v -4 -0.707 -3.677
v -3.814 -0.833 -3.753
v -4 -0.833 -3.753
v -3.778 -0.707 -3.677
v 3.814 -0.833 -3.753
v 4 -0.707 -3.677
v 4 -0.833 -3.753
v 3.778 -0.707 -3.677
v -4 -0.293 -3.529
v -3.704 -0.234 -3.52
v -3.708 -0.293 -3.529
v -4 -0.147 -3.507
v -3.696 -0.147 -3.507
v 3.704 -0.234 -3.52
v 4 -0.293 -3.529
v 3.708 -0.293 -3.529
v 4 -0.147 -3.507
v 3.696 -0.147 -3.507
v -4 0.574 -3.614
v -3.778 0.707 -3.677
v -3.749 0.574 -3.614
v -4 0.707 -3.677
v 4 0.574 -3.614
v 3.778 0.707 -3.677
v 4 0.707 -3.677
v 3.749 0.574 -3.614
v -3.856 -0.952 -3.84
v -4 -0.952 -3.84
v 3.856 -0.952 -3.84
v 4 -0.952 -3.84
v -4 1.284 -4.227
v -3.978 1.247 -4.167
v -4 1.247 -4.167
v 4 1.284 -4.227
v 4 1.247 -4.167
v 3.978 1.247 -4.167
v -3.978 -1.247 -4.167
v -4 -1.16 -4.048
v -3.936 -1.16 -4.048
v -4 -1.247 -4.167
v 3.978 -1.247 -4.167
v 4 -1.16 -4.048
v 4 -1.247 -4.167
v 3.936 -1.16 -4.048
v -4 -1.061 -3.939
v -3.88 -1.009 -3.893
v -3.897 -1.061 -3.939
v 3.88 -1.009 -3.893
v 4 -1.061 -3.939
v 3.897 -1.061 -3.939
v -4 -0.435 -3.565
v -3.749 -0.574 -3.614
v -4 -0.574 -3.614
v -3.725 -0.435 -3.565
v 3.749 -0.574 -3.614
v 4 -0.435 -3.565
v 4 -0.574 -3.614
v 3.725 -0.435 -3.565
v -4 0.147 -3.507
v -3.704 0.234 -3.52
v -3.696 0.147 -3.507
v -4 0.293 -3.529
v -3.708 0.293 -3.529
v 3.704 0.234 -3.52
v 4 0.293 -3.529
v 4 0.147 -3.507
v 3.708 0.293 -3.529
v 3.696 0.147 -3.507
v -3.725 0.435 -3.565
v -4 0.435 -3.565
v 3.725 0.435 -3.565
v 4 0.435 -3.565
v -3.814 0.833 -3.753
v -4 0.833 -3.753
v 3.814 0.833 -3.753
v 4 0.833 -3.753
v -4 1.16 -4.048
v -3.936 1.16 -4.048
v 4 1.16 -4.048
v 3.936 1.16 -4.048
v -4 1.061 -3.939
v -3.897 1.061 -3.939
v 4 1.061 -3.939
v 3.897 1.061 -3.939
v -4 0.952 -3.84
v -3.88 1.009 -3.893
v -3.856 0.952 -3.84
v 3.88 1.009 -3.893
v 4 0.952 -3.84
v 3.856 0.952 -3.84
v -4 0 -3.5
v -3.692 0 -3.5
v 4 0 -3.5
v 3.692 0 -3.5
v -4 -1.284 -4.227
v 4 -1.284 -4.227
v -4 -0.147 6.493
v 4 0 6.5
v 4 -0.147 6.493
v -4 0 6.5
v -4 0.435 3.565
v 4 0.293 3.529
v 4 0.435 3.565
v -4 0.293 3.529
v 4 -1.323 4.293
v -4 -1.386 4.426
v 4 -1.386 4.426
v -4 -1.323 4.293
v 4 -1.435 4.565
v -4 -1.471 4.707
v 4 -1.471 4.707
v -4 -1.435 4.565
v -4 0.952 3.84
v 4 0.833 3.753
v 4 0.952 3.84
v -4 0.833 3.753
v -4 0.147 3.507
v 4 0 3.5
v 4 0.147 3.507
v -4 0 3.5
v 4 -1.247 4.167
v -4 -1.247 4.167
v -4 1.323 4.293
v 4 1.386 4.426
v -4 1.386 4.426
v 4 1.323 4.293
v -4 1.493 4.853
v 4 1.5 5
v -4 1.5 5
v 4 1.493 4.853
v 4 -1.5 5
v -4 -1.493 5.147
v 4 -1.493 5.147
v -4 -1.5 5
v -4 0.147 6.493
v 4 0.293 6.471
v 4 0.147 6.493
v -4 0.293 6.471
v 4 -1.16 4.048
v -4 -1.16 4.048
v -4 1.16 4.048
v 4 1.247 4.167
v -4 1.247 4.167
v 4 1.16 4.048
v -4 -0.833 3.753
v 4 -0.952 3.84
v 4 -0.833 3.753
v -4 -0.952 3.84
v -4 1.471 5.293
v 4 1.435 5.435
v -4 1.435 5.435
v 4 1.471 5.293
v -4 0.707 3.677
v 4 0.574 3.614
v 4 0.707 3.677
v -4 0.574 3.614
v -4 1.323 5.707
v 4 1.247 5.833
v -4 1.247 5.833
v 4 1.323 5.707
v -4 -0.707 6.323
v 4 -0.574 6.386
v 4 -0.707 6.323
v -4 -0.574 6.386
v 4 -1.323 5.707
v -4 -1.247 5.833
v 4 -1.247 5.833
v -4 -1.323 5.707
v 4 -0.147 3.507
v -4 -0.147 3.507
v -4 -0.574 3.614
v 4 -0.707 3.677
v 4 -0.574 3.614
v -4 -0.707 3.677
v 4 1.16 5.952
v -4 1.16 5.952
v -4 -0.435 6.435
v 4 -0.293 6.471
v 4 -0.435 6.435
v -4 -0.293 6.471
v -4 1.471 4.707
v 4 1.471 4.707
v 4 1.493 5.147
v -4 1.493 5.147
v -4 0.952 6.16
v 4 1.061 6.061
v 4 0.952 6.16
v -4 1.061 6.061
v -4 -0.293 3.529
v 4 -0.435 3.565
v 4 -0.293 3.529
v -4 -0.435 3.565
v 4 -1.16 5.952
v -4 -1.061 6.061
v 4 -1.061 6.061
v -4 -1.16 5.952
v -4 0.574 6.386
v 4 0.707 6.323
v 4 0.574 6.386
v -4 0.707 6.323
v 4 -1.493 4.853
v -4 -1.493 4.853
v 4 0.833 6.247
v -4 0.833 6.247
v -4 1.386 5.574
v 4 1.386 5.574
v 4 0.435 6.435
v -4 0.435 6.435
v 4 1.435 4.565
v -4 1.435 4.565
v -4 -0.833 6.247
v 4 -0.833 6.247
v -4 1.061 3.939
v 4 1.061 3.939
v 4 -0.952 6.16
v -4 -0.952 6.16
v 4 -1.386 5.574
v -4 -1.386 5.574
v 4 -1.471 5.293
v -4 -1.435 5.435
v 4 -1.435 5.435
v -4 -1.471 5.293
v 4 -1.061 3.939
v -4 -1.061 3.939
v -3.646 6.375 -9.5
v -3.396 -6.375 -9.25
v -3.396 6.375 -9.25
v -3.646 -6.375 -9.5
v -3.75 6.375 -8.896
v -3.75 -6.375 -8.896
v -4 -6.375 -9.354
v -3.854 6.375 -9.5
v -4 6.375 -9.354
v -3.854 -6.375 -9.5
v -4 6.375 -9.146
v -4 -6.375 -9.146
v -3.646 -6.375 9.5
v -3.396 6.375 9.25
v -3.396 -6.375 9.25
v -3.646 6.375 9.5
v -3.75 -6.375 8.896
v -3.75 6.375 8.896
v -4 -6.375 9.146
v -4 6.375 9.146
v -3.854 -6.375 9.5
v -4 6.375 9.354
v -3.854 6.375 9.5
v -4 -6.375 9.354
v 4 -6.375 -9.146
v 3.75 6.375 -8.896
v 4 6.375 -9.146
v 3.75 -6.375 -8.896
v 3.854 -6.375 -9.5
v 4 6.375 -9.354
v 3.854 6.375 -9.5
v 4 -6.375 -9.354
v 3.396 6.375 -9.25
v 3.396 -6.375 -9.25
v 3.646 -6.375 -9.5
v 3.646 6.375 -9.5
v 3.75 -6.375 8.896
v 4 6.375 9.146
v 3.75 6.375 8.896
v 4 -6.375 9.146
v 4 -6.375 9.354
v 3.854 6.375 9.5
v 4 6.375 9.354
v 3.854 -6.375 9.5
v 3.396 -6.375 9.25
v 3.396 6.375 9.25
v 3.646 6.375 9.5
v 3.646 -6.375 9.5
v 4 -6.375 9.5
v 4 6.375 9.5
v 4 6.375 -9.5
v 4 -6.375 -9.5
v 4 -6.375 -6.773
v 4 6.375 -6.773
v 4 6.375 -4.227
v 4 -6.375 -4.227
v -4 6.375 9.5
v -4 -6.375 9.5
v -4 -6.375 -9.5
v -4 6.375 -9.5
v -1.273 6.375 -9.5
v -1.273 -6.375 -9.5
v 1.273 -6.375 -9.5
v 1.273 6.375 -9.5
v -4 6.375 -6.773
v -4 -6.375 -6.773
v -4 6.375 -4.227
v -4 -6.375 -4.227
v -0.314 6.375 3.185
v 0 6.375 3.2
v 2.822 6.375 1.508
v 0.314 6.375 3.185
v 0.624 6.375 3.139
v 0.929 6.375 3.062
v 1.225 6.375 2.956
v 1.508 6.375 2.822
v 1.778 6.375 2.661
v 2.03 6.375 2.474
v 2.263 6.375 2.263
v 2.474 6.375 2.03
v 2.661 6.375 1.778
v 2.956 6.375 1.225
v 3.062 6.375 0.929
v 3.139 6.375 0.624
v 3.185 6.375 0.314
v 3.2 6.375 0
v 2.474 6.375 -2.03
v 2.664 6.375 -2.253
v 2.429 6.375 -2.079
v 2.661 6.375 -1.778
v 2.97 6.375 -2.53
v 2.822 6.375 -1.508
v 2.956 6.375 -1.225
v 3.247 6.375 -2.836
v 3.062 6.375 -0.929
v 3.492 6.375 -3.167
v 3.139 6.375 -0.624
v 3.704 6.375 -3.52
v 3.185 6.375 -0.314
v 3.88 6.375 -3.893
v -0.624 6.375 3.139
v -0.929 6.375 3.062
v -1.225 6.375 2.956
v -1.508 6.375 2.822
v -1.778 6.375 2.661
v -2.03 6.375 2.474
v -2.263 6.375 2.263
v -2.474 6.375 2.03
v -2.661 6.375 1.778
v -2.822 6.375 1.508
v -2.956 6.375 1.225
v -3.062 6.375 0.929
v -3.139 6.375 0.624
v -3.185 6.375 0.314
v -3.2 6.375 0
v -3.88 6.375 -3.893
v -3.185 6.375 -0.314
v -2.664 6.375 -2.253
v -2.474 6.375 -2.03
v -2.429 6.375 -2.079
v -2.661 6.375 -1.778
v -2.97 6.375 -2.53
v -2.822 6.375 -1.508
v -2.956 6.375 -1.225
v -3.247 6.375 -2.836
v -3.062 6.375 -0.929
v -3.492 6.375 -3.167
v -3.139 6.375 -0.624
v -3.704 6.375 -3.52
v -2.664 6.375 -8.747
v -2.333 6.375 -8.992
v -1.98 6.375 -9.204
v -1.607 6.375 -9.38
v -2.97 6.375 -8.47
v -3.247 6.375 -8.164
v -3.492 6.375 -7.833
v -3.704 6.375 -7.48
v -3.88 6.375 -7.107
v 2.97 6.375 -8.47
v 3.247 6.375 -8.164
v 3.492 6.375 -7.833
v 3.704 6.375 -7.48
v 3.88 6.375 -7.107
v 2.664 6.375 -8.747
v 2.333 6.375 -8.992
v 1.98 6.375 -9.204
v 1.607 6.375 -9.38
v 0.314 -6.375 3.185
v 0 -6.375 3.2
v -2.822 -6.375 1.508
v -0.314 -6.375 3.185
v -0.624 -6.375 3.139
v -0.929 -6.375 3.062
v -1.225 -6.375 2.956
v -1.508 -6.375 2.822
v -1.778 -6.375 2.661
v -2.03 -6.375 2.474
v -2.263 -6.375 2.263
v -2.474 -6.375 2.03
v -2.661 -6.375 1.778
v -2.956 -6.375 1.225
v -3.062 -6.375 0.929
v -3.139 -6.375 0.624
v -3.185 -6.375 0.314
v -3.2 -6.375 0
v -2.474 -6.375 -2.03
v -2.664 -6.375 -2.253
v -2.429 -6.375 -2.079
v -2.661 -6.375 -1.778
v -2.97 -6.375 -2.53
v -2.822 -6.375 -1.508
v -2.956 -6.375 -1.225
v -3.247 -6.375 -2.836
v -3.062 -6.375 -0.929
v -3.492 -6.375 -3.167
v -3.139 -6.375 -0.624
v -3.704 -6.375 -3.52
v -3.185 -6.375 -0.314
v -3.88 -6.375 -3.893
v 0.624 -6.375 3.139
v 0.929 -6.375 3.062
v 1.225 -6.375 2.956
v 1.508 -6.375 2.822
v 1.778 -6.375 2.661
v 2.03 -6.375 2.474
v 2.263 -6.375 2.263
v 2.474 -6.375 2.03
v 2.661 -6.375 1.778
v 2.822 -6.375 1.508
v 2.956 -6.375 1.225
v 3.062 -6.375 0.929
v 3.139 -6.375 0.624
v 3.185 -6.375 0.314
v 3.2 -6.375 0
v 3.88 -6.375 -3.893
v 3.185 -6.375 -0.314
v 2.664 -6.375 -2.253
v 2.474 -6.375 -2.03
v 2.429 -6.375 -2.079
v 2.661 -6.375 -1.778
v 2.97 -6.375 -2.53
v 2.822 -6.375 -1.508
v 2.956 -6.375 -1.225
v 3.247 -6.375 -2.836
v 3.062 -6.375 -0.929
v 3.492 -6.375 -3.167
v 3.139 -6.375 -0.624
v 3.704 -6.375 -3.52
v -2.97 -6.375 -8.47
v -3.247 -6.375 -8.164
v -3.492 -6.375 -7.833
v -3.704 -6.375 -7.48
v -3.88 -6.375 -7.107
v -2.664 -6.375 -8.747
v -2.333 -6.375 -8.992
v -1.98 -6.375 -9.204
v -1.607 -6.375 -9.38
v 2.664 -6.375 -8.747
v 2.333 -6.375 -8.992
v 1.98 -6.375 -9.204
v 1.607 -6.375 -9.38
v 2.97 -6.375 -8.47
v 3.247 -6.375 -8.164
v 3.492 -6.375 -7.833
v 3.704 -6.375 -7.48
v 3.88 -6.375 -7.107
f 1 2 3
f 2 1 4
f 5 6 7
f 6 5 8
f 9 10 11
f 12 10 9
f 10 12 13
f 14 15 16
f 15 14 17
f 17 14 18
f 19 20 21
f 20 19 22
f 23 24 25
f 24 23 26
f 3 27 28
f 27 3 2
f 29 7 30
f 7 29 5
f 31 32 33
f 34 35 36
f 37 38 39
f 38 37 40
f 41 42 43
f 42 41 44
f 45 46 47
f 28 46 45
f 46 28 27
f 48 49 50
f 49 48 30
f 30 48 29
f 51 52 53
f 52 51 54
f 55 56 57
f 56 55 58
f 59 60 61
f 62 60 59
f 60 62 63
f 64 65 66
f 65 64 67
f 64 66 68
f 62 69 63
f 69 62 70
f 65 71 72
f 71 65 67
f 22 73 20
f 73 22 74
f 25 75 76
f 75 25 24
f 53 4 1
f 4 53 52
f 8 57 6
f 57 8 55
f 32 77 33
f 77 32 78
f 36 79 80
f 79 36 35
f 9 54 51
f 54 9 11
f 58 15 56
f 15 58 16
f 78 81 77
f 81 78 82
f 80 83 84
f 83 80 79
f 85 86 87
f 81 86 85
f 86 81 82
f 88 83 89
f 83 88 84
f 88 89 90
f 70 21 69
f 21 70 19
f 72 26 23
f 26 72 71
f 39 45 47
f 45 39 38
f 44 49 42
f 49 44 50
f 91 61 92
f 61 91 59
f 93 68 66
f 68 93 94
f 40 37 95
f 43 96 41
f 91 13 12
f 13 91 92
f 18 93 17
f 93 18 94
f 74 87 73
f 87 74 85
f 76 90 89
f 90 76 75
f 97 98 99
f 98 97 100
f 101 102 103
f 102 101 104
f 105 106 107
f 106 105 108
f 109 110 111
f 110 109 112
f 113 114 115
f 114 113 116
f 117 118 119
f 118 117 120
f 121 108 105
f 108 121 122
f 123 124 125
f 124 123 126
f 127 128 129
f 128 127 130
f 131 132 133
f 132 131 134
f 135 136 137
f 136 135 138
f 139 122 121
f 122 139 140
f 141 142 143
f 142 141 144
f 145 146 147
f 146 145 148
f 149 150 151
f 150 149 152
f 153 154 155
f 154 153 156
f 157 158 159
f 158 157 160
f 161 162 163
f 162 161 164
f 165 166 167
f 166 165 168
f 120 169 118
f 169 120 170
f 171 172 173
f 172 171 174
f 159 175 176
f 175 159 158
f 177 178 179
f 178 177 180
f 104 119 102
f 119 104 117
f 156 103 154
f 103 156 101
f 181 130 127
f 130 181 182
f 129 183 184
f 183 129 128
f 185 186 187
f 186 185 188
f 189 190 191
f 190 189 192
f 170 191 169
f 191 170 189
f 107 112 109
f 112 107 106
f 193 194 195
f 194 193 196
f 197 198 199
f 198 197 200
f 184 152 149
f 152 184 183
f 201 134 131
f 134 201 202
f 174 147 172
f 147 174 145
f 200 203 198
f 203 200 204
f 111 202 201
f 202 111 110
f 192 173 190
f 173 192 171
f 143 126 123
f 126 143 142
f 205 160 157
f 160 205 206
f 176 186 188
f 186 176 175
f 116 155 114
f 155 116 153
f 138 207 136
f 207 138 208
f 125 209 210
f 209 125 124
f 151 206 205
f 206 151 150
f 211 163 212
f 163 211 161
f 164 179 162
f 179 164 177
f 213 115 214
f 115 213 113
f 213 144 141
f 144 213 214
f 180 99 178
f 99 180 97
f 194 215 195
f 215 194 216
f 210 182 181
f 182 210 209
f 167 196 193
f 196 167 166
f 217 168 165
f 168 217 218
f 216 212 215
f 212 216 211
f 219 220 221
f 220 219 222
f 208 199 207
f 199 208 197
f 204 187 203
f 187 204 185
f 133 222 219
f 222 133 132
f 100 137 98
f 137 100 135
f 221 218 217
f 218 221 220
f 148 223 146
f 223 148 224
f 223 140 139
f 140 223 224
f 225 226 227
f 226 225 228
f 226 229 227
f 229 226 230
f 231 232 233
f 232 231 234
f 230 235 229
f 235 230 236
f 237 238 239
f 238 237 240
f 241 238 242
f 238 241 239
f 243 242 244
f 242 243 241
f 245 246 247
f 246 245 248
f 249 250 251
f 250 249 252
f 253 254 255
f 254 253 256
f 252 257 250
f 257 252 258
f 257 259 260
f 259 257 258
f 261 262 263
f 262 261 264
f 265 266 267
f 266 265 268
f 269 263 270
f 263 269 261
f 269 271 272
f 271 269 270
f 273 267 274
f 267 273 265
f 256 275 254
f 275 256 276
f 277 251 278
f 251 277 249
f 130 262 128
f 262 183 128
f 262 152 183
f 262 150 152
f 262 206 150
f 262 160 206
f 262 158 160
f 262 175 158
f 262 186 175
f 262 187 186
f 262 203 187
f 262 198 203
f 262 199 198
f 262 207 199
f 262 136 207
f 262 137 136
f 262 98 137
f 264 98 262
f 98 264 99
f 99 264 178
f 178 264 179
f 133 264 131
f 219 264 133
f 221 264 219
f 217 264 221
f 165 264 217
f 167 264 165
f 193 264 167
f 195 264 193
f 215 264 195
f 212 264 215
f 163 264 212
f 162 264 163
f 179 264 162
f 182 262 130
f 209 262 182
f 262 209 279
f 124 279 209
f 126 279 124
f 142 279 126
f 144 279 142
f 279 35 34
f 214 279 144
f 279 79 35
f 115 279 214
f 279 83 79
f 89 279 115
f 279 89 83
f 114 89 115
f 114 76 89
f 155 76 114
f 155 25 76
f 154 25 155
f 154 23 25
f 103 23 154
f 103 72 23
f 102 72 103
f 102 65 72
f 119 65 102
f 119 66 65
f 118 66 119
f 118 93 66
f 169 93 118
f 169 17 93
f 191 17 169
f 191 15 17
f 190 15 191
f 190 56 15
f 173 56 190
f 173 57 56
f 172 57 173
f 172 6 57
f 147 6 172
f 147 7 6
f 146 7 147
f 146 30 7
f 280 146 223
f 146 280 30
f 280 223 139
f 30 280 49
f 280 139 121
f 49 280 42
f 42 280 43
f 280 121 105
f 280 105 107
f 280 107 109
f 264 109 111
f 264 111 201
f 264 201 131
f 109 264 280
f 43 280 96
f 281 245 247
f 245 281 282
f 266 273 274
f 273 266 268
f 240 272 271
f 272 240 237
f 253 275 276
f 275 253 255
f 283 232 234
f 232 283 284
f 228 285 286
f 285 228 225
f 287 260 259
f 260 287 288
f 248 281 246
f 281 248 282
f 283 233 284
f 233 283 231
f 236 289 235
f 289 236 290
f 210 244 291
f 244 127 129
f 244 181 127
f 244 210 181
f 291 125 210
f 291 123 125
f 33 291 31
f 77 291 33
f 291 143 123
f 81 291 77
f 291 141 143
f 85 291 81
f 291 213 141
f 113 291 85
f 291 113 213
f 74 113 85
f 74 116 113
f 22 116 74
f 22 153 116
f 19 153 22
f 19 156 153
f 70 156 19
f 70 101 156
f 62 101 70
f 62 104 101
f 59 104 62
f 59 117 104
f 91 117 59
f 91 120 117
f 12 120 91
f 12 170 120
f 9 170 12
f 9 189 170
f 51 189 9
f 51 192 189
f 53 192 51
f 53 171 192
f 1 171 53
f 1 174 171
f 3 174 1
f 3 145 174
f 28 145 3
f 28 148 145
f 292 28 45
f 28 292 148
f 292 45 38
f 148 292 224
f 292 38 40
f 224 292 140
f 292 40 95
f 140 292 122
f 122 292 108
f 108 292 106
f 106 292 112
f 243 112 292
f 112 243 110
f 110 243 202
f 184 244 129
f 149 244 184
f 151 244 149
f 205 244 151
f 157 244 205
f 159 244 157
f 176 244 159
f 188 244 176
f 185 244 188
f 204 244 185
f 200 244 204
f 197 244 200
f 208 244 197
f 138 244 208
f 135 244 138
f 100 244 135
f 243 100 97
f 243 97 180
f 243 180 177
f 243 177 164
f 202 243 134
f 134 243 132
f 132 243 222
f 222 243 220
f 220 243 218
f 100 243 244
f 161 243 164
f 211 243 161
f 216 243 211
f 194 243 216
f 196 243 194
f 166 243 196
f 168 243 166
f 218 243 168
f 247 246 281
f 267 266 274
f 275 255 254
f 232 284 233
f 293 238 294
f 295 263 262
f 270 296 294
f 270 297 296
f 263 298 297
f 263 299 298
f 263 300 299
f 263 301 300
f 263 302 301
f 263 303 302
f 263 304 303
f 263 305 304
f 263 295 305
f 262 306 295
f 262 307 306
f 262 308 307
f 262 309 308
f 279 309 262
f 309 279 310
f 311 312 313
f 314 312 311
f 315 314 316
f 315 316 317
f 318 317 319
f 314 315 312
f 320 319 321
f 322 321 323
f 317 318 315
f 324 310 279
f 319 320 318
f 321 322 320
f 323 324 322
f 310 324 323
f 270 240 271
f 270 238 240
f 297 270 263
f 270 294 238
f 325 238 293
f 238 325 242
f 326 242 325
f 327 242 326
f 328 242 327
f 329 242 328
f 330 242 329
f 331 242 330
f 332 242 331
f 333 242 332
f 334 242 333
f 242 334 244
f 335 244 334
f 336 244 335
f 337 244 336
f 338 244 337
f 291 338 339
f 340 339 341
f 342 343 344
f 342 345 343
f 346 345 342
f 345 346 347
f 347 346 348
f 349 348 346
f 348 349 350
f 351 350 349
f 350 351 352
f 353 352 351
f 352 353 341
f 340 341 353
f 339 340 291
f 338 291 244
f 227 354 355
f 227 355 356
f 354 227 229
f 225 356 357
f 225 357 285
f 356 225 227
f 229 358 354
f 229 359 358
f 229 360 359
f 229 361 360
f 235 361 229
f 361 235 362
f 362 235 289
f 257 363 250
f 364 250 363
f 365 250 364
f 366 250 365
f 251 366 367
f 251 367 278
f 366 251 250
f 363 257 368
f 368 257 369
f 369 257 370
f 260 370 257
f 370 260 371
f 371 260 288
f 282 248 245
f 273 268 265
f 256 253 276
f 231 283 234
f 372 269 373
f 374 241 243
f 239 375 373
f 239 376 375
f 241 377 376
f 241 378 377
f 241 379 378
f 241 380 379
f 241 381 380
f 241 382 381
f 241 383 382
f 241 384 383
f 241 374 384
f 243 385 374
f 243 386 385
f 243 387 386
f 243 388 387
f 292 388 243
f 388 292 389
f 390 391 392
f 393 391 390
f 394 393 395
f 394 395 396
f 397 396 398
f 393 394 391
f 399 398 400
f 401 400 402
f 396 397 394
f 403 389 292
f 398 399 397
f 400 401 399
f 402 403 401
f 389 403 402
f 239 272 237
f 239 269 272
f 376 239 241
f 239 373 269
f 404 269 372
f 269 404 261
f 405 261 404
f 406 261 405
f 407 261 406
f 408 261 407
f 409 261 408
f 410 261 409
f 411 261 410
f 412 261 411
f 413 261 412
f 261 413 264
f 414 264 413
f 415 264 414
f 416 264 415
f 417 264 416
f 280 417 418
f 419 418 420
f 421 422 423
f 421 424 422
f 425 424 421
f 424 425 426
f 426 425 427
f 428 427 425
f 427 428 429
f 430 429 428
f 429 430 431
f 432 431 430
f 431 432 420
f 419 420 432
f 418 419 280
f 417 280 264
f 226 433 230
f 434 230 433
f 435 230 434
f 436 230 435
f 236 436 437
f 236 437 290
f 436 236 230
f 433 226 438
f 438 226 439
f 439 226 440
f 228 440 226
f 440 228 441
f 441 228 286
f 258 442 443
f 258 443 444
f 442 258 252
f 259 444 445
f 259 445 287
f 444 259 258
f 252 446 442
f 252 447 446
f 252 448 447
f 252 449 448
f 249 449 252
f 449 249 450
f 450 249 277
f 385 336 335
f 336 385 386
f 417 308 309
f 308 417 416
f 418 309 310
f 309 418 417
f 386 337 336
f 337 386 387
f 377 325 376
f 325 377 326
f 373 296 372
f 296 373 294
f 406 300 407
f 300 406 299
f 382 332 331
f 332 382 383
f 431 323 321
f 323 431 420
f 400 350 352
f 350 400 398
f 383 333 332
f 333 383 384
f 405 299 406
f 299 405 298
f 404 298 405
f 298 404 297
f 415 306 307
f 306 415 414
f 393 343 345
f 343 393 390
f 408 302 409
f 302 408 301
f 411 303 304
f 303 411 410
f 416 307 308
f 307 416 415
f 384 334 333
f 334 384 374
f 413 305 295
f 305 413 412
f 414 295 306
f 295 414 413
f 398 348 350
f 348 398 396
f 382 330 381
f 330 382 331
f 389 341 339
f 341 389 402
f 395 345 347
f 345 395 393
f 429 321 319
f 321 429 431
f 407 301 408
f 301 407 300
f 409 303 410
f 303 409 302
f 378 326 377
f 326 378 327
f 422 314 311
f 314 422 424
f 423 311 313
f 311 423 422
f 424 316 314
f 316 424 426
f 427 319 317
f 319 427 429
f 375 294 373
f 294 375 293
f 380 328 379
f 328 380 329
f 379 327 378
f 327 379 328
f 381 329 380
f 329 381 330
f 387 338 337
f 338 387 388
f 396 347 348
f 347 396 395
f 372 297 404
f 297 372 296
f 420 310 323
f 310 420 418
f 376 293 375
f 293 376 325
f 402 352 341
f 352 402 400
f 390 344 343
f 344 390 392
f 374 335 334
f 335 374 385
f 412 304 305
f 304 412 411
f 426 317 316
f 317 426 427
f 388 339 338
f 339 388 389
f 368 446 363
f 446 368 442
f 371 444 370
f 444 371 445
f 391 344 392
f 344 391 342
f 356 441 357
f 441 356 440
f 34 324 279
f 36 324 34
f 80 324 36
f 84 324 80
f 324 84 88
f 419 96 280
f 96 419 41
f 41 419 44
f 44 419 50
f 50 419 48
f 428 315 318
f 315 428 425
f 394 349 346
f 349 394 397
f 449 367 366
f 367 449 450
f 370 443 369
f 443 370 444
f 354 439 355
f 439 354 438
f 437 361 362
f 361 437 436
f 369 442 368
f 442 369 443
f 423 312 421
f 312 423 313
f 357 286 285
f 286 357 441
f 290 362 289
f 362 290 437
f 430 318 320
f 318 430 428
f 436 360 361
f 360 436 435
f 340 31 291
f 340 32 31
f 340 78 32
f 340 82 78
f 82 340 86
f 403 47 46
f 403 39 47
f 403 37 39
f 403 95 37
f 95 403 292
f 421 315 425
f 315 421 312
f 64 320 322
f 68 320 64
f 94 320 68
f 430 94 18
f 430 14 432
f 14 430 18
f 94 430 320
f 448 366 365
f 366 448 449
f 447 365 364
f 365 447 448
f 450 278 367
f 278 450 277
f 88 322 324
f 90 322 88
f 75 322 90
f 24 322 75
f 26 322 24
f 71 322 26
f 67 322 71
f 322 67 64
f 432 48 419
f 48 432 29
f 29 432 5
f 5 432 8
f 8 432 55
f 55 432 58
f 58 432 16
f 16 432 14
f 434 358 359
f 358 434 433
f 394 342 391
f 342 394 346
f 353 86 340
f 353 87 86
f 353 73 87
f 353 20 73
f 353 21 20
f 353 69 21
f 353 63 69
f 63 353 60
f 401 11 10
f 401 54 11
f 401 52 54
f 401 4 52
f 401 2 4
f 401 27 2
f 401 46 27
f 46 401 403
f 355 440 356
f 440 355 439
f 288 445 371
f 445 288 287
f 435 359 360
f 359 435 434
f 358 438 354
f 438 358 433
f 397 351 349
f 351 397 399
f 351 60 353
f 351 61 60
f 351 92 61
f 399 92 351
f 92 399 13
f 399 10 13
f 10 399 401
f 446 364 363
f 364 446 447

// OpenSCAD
// Leadscrew nut housing block: 8.0mm x 12.75mm x 19.0mm
// One connected solid (housing only). No separate leadscrew/leadnut parts.

// Parameters
block_width_mm  = 8.0;    //[4.0:16.0:0.25]   // X
block_height_mm = 12.75;  //[6.0:25.5:0.25]   // Y
block_length_mm = 19.0;   //[9.5:38.0:0.5]    // Z

clearance_mm = 0.2;       //[0.0:1.0:0.05]
chamfer_mm   = 0.5;       //[0.0:2.0:0.1]

bore_diameter_mm       = 6.0;  //[2.0:12.0:0.25]  // through-bore
nut_outer_diameter_mm  = 8.0;  //[4.0:16.0:0.25]  // counterbore/pocket diameter
nut_pocket_depth_mm    = 8.0;  //[0.0:19.0:0.5]   // pocket depth from one end along Z

mount_hole_diameter_mm = 3.0;  //[1.5:6.0:0.25]
mount_hole_spacing_mm  = 10.0; //[4.0:16.0:0.5]

overlap_mm = 1.0; //[0.5:2.0:0.1]
$fn = 64;

// Main housing (single solid with subtracted features)
module housing() {
  difference() {
    // Body
    cube([block_width_mm, block_height_mm, block_length_mm], center=true);

    // Through bore along Y (matches orthographic: circle on front/back faces)
    rotate([90, 0, 0])
      cylinder(d=bore_diameter_mm + 2*clearance_mm,
               h=block_height_mm + 2*overlap_mm,
               center=true);

    // Nut pocket (counterbore) from the -Z end, coaxial with bore, along Y
    // Positioned so pocket starts at -block_length/2 and extends +nut_pocket_depth
    translate([0, 0, -block_length_mm/2 + nut_pocket_depth_mm/2])
      rotate([90, 0, 0])
        cylinder(d=nut_outer_diameter_mm + 2*clearance_mm,
                 h=block_height_mm + 2*overlap_mm,
                 center=true);

    // Mounting holes along X, spaced along Z
    for (zpos = [-mount_hole_spacing_mm/2, mount_hole_spacing_mm/2])
      translate([0, 0, zpos])
        rotate([0, 90, 0])
          cylinder(d=mount_hole_diameter_mm,
                   h=block_width_mm + 2*overlap_mm,
                   center=true);

    // Corner chamfers (remove material at all 4 vertical edges, both ends)
    // Implemented as rotated cubes that intersect the corners.
    for (sx = [-1, 1], sz = [-1, 1])
      translate([sx*(block_width_mm/2 - chamfer_mm/2), 0, sz*(block_length_mm/2 - chamfer_mm/2)])
        rotate([0, 45, 0])
          cube([chamfer_mm, block_height_mm + 2*overlap_mm, chamfer_mm], center=true);
  }
}

housing();
